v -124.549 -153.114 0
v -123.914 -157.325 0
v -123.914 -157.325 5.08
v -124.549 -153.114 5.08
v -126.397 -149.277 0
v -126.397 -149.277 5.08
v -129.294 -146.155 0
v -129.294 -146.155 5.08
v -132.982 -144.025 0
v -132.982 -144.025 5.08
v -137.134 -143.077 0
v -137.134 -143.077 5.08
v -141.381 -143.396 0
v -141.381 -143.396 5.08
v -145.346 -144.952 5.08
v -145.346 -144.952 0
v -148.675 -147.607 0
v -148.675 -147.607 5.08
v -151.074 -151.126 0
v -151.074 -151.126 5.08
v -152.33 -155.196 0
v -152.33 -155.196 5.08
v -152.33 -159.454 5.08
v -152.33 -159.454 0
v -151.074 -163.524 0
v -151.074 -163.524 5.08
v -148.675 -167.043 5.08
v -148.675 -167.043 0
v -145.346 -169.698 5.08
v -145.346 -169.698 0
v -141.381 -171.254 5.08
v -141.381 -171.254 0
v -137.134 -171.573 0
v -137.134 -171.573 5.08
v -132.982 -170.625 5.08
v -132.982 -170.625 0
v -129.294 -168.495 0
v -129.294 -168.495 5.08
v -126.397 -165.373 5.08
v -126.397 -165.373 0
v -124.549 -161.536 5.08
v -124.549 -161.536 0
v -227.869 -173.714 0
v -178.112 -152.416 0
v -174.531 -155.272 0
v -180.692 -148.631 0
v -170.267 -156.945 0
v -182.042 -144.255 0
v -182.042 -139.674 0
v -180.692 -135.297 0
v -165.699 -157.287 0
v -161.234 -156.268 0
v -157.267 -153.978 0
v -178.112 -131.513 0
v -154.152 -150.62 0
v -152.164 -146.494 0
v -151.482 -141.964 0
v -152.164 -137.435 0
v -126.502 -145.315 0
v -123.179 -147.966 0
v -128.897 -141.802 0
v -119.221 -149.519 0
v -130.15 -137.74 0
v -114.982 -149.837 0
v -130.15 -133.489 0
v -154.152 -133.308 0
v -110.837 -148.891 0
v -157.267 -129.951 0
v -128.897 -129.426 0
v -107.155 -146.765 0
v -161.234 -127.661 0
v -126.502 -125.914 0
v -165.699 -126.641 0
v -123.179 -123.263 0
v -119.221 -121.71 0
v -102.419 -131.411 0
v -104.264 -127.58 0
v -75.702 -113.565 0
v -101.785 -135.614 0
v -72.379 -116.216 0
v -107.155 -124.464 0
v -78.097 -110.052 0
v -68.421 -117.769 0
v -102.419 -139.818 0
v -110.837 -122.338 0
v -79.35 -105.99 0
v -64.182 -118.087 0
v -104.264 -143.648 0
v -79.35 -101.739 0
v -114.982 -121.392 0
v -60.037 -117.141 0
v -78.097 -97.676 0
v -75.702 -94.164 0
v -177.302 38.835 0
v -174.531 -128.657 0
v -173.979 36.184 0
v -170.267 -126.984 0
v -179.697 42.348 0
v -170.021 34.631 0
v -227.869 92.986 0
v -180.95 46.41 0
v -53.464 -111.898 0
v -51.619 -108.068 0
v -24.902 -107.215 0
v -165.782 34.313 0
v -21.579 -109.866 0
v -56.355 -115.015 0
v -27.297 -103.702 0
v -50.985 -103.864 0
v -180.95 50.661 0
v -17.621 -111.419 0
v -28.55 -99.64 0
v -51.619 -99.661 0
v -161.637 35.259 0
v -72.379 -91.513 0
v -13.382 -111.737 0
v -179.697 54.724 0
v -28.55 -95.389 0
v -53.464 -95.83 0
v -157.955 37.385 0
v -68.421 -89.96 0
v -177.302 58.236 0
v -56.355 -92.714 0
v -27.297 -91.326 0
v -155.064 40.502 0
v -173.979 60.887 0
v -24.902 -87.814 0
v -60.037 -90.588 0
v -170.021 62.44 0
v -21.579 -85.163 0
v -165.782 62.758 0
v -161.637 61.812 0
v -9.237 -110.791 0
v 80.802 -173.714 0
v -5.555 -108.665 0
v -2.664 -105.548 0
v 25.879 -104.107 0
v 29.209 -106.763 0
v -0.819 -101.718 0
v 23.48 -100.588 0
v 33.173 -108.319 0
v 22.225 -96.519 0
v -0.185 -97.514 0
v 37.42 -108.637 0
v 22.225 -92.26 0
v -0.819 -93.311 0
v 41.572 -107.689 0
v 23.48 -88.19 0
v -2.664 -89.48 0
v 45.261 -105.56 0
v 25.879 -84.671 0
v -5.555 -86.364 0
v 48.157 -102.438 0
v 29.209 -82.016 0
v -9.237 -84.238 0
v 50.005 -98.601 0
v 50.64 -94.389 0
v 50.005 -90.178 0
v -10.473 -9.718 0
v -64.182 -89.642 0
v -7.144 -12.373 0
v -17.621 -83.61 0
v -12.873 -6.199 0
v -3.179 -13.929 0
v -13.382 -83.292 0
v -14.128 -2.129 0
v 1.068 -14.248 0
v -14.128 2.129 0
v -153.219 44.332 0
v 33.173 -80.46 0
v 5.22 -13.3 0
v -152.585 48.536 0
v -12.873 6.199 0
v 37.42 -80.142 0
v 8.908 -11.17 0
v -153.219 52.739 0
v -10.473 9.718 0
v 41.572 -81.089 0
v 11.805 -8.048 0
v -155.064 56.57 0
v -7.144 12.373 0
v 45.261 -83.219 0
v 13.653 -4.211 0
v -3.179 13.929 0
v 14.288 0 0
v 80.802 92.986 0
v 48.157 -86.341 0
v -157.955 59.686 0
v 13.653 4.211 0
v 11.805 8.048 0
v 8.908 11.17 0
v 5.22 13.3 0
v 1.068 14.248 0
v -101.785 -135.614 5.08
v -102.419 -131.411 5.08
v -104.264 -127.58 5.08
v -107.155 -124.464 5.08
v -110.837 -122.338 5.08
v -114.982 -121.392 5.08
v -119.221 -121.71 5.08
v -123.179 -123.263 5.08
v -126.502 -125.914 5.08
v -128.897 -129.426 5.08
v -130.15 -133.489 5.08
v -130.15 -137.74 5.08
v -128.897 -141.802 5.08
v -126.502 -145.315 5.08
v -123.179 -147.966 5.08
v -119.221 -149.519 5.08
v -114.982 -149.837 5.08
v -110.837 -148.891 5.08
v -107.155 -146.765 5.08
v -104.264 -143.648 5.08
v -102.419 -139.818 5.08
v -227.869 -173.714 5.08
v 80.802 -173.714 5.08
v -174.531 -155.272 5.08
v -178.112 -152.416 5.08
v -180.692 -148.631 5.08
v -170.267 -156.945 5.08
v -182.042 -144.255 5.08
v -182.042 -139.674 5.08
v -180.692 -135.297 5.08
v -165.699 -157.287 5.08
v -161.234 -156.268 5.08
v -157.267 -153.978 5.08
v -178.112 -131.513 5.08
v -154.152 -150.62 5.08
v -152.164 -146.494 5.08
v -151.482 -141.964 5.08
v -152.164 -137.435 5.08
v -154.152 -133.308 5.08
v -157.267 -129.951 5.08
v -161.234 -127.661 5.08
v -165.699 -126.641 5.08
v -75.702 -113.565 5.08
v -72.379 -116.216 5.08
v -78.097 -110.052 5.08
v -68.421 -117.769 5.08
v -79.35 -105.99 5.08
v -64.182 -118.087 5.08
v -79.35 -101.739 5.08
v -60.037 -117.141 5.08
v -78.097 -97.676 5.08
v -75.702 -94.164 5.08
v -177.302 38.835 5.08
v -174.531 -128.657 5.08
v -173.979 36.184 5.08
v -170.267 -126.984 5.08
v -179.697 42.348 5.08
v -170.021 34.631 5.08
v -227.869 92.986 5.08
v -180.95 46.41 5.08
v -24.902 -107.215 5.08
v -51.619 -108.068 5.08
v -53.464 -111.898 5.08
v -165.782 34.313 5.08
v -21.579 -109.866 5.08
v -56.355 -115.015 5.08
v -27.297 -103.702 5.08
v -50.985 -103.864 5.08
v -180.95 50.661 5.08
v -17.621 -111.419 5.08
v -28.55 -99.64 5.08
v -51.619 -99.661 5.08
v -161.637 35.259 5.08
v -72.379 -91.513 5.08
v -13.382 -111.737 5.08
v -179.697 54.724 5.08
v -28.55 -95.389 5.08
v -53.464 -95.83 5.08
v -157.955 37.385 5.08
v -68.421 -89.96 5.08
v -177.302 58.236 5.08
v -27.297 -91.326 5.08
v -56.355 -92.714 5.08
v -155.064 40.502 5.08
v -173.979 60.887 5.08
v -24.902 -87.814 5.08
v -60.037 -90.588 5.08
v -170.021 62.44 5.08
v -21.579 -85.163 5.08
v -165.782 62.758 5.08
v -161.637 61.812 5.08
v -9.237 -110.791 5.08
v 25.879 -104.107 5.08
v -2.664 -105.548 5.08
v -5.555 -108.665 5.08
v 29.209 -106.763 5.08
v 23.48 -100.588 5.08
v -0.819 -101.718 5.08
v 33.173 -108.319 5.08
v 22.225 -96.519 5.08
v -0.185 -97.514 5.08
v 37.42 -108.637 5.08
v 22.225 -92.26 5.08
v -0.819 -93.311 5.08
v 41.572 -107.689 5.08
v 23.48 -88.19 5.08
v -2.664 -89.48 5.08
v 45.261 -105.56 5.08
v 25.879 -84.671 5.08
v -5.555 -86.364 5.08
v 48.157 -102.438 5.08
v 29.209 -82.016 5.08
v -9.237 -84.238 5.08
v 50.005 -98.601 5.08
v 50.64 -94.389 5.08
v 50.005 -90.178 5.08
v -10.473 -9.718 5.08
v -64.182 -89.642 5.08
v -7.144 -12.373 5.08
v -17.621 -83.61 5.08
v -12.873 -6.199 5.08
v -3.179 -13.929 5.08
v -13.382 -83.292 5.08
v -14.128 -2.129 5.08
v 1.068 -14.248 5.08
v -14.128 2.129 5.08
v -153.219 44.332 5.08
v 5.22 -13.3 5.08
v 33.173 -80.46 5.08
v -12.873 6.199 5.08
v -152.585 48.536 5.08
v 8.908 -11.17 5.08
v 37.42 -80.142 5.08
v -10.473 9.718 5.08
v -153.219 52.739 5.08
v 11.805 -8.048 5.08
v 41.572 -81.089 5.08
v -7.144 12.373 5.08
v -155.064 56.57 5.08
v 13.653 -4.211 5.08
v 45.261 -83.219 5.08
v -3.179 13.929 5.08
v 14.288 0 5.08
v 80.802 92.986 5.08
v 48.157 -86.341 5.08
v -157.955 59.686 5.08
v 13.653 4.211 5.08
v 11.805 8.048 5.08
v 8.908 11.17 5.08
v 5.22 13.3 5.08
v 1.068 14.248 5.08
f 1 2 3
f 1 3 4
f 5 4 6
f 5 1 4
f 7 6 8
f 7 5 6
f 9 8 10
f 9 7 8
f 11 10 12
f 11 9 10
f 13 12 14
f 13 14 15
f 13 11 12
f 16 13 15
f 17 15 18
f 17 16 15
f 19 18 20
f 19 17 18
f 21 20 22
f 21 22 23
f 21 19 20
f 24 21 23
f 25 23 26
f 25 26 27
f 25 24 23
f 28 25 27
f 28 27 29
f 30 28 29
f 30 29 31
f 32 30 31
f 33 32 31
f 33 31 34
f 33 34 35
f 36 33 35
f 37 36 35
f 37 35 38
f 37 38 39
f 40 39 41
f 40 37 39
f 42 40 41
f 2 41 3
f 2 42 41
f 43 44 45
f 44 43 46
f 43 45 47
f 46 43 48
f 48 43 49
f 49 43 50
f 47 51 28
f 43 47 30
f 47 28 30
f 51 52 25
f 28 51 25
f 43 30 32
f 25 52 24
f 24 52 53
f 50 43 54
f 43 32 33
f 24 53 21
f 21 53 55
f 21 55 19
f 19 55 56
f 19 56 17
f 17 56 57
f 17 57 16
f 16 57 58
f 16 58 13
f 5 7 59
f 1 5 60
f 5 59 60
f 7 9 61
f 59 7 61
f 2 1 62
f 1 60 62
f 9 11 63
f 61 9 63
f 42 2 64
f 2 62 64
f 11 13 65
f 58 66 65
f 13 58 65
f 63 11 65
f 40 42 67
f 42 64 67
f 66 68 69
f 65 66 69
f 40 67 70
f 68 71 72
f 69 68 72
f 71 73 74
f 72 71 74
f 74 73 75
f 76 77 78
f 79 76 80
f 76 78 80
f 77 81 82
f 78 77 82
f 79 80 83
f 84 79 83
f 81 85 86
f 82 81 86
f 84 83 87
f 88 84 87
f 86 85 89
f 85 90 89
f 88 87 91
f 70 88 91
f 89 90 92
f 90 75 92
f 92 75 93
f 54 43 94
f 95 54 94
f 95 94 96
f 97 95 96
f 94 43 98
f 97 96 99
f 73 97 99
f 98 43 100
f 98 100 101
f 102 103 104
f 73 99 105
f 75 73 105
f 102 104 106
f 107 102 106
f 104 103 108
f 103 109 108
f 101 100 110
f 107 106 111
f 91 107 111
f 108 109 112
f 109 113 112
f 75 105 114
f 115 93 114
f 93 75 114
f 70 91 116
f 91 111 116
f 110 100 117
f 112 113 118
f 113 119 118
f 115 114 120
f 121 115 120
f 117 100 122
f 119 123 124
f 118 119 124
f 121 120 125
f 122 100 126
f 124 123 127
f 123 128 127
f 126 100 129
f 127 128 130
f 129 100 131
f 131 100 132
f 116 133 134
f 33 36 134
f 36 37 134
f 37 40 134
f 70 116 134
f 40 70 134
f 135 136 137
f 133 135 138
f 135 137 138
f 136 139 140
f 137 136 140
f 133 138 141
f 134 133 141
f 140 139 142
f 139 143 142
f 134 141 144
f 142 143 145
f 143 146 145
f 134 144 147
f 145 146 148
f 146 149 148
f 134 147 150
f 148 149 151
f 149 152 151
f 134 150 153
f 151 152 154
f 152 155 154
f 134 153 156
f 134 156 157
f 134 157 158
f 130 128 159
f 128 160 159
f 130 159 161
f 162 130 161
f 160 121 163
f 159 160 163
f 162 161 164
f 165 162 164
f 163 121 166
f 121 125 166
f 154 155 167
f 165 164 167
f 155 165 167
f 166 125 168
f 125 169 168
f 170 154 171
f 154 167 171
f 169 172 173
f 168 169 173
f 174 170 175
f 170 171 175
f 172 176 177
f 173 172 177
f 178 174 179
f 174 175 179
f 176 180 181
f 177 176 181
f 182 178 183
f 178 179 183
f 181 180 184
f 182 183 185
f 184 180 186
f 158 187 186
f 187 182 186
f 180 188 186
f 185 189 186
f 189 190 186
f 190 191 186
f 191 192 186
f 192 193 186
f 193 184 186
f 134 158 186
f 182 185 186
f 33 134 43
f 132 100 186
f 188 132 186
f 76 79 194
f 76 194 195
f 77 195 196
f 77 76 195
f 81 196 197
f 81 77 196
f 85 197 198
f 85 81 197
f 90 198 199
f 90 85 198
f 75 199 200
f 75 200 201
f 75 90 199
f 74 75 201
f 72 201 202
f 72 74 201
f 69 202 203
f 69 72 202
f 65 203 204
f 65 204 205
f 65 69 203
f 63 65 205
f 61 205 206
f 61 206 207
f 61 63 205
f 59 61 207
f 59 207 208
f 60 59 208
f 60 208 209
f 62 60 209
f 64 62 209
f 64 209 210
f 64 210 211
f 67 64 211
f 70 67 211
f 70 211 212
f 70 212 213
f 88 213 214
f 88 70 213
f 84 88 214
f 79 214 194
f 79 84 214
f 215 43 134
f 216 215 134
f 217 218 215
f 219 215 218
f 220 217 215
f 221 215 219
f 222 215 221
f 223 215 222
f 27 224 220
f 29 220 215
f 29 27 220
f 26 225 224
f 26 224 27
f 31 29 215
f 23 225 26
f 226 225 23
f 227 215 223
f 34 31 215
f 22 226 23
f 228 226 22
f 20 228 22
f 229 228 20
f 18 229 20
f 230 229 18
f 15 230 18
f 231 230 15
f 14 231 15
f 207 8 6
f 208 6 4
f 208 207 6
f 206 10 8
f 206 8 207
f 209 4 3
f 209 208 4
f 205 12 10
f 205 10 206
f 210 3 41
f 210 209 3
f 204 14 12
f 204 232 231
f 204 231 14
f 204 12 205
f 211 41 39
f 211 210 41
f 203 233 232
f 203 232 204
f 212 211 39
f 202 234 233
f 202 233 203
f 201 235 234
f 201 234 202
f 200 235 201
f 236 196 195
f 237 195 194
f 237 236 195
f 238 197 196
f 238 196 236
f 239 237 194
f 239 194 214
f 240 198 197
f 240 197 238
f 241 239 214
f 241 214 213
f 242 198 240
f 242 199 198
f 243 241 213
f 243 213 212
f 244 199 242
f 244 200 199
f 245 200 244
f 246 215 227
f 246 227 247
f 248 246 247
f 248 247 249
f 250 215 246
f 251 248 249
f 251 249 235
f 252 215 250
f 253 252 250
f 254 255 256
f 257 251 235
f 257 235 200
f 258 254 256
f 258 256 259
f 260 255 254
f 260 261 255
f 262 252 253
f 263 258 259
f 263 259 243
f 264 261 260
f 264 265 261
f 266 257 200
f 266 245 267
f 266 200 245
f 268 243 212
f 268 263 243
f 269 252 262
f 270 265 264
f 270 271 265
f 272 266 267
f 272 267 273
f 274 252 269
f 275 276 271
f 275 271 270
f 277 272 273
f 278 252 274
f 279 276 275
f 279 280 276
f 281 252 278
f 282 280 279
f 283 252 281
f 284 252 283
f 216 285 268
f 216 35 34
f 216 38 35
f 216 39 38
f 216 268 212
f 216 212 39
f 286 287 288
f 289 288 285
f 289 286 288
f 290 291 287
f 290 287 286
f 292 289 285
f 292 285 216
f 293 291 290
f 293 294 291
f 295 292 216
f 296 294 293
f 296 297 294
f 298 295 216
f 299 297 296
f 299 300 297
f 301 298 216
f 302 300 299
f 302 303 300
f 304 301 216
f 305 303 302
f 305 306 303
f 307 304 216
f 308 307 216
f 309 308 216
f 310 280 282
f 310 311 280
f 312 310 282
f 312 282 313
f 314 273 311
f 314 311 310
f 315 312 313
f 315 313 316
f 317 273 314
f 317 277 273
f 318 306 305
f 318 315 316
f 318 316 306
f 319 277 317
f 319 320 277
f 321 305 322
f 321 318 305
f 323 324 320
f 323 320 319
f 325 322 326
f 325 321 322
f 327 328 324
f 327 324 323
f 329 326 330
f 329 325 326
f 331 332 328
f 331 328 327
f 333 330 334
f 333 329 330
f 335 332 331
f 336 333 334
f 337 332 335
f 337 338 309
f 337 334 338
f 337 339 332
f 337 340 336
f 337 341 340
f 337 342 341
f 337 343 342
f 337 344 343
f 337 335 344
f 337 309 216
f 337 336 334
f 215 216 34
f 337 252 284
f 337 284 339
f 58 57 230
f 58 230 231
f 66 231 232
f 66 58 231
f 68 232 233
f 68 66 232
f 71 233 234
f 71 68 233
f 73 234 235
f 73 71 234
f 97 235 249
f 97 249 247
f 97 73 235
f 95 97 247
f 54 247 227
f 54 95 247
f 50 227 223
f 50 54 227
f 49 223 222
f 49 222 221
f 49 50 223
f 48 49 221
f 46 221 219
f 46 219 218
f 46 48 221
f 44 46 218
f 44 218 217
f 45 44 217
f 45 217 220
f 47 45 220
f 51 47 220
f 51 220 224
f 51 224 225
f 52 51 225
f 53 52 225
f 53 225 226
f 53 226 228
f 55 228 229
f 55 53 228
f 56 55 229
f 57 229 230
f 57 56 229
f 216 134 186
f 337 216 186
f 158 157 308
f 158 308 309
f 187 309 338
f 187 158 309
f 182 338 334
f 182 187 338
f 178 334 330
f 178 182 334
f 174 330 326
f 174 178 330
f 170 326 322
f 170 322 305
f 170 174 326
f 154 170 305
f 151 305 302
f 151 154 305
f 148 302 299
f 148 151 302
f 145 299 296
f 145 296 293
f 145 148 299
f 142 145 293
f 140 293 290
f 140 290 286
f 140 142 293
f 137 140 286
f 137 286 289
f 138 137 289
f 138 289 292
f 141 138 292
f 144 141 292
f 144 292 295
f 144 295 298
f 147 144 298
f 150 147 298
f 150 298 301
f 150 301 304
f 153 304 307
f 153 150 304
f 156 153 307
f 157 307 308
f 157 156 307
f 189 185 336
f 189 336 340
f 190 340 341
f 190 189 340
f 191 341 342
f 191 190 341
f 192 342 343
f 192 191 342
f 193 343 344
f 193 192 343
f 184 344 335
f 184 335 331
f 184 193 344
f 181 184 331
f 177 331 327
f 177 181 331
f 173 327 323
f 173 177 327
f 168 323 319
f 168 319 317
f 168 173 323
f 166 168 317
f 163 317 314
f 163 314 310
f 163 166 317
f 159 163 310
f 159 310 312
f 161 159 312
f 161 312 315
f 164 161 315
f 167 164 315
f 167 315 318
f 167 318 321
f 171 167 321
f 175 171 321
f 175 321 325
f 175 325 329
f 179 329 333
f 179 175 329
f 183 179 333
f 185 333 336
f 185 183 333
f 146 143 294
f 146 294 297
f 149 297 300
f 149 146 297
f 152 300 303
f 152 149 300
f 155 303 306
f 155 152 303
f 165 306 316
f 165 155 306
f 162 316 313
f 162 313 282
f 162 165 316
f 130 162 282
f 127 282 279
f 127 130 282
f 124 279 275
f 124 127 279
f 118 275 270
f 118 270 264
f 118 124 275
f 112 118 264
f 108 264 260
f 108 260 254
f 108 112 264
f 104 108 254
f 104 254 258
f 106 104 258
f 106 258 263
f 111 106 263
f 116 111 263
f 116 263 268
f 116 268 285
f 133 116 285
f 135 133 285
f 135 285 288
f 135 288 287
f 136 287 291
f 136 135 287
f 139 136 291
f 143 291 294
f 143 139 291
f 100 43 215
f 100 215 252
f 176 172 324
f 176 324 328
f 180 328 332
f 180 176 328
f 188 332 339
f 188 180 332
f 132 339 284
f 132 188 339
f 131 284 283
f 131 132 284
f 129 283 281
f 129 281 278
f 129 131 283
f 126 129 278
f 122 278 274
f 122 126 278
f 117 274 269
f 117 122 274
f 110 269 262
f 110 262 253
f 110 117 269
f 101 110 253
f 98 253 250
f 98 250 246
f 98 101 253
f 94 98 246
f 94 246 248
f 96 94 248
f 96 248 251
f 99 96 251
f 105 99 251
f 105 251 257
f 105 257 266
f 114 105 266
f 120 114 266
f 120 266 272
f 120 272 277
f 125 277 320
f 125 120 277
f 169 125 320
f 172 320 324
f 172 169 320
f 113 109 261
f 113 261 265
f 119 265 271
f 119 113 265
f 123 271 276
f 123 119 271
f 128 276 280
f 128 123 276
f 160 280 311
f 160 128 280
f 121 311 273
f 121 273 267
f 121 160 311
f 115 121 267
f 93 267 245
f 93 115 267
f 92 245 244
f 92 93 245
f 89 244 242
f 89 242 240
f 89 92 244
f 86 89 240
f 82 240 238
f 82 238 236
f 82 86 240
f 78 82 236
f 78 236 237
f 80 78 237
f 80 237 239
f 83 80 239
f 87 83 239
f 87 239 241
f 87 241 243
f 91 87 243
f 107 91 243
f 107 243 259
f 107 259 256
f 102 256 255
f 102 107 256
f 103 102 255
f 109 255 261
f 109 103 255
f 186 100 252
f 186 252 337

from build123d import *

# Parameters (mm, degrees)
SKETCH1_W           = 308.670974492
SKETCH1_H           = 266.7
SKETCH1_R           = 14.2875
SKETCH1_R_2         = 14.2621
SKETCH1_R_3         = 15.365901376
BOSS_EXTRUDE1_DEPTH = 5.08


with BuildPart() as part:
    # Sketch1 → Boss-Extrude1 (new body)
    with BuildSketch(Plane.XY):
        with Locations((-73.533038571, -40.364359579)):
            Rectangle(SKETCH1_W, SKETCH1_H)
        Circle(SKETCH1_R, mode=Mode.SUBTRACT)
        with Locations((-138.201859455, -157.325049094)):
            Circle(SKETCH1_R, mode=Mode.SUBTRACT)
        with Locations((-166.847551324, 48.535640421)):
            Circle(SKETCH1_R_2, mode=Mode.SUBTRACT)
        with Locations((-166.847551324, -141.964359579)):
            Circle(SKETCH1_R_3, mode=Mode.SUBTRACT)
        with Locations((-116.047551324, -135.614359579)):
            Circle(SKETCH1_R_2, mode=Mode.SUBTRACT)
        with Locations((-65.247551325, -103.864359579)):
            Circle(SKETCH1_R_2, mode=Mode.SUBTRACT)
        with Locations((-14.447551325, -97.514359579)):
            Circle(SKETCH1_R_2, mode=Mode.SUBTRACT)
        with Locations((36.352448675, -94.389320601)):
            Circle(SKETCH1_R, mode=Mode.SUBTRACT)
    extrude(amount=BOSS_EXTRUDE1_DEPTH)


solid = part.part
